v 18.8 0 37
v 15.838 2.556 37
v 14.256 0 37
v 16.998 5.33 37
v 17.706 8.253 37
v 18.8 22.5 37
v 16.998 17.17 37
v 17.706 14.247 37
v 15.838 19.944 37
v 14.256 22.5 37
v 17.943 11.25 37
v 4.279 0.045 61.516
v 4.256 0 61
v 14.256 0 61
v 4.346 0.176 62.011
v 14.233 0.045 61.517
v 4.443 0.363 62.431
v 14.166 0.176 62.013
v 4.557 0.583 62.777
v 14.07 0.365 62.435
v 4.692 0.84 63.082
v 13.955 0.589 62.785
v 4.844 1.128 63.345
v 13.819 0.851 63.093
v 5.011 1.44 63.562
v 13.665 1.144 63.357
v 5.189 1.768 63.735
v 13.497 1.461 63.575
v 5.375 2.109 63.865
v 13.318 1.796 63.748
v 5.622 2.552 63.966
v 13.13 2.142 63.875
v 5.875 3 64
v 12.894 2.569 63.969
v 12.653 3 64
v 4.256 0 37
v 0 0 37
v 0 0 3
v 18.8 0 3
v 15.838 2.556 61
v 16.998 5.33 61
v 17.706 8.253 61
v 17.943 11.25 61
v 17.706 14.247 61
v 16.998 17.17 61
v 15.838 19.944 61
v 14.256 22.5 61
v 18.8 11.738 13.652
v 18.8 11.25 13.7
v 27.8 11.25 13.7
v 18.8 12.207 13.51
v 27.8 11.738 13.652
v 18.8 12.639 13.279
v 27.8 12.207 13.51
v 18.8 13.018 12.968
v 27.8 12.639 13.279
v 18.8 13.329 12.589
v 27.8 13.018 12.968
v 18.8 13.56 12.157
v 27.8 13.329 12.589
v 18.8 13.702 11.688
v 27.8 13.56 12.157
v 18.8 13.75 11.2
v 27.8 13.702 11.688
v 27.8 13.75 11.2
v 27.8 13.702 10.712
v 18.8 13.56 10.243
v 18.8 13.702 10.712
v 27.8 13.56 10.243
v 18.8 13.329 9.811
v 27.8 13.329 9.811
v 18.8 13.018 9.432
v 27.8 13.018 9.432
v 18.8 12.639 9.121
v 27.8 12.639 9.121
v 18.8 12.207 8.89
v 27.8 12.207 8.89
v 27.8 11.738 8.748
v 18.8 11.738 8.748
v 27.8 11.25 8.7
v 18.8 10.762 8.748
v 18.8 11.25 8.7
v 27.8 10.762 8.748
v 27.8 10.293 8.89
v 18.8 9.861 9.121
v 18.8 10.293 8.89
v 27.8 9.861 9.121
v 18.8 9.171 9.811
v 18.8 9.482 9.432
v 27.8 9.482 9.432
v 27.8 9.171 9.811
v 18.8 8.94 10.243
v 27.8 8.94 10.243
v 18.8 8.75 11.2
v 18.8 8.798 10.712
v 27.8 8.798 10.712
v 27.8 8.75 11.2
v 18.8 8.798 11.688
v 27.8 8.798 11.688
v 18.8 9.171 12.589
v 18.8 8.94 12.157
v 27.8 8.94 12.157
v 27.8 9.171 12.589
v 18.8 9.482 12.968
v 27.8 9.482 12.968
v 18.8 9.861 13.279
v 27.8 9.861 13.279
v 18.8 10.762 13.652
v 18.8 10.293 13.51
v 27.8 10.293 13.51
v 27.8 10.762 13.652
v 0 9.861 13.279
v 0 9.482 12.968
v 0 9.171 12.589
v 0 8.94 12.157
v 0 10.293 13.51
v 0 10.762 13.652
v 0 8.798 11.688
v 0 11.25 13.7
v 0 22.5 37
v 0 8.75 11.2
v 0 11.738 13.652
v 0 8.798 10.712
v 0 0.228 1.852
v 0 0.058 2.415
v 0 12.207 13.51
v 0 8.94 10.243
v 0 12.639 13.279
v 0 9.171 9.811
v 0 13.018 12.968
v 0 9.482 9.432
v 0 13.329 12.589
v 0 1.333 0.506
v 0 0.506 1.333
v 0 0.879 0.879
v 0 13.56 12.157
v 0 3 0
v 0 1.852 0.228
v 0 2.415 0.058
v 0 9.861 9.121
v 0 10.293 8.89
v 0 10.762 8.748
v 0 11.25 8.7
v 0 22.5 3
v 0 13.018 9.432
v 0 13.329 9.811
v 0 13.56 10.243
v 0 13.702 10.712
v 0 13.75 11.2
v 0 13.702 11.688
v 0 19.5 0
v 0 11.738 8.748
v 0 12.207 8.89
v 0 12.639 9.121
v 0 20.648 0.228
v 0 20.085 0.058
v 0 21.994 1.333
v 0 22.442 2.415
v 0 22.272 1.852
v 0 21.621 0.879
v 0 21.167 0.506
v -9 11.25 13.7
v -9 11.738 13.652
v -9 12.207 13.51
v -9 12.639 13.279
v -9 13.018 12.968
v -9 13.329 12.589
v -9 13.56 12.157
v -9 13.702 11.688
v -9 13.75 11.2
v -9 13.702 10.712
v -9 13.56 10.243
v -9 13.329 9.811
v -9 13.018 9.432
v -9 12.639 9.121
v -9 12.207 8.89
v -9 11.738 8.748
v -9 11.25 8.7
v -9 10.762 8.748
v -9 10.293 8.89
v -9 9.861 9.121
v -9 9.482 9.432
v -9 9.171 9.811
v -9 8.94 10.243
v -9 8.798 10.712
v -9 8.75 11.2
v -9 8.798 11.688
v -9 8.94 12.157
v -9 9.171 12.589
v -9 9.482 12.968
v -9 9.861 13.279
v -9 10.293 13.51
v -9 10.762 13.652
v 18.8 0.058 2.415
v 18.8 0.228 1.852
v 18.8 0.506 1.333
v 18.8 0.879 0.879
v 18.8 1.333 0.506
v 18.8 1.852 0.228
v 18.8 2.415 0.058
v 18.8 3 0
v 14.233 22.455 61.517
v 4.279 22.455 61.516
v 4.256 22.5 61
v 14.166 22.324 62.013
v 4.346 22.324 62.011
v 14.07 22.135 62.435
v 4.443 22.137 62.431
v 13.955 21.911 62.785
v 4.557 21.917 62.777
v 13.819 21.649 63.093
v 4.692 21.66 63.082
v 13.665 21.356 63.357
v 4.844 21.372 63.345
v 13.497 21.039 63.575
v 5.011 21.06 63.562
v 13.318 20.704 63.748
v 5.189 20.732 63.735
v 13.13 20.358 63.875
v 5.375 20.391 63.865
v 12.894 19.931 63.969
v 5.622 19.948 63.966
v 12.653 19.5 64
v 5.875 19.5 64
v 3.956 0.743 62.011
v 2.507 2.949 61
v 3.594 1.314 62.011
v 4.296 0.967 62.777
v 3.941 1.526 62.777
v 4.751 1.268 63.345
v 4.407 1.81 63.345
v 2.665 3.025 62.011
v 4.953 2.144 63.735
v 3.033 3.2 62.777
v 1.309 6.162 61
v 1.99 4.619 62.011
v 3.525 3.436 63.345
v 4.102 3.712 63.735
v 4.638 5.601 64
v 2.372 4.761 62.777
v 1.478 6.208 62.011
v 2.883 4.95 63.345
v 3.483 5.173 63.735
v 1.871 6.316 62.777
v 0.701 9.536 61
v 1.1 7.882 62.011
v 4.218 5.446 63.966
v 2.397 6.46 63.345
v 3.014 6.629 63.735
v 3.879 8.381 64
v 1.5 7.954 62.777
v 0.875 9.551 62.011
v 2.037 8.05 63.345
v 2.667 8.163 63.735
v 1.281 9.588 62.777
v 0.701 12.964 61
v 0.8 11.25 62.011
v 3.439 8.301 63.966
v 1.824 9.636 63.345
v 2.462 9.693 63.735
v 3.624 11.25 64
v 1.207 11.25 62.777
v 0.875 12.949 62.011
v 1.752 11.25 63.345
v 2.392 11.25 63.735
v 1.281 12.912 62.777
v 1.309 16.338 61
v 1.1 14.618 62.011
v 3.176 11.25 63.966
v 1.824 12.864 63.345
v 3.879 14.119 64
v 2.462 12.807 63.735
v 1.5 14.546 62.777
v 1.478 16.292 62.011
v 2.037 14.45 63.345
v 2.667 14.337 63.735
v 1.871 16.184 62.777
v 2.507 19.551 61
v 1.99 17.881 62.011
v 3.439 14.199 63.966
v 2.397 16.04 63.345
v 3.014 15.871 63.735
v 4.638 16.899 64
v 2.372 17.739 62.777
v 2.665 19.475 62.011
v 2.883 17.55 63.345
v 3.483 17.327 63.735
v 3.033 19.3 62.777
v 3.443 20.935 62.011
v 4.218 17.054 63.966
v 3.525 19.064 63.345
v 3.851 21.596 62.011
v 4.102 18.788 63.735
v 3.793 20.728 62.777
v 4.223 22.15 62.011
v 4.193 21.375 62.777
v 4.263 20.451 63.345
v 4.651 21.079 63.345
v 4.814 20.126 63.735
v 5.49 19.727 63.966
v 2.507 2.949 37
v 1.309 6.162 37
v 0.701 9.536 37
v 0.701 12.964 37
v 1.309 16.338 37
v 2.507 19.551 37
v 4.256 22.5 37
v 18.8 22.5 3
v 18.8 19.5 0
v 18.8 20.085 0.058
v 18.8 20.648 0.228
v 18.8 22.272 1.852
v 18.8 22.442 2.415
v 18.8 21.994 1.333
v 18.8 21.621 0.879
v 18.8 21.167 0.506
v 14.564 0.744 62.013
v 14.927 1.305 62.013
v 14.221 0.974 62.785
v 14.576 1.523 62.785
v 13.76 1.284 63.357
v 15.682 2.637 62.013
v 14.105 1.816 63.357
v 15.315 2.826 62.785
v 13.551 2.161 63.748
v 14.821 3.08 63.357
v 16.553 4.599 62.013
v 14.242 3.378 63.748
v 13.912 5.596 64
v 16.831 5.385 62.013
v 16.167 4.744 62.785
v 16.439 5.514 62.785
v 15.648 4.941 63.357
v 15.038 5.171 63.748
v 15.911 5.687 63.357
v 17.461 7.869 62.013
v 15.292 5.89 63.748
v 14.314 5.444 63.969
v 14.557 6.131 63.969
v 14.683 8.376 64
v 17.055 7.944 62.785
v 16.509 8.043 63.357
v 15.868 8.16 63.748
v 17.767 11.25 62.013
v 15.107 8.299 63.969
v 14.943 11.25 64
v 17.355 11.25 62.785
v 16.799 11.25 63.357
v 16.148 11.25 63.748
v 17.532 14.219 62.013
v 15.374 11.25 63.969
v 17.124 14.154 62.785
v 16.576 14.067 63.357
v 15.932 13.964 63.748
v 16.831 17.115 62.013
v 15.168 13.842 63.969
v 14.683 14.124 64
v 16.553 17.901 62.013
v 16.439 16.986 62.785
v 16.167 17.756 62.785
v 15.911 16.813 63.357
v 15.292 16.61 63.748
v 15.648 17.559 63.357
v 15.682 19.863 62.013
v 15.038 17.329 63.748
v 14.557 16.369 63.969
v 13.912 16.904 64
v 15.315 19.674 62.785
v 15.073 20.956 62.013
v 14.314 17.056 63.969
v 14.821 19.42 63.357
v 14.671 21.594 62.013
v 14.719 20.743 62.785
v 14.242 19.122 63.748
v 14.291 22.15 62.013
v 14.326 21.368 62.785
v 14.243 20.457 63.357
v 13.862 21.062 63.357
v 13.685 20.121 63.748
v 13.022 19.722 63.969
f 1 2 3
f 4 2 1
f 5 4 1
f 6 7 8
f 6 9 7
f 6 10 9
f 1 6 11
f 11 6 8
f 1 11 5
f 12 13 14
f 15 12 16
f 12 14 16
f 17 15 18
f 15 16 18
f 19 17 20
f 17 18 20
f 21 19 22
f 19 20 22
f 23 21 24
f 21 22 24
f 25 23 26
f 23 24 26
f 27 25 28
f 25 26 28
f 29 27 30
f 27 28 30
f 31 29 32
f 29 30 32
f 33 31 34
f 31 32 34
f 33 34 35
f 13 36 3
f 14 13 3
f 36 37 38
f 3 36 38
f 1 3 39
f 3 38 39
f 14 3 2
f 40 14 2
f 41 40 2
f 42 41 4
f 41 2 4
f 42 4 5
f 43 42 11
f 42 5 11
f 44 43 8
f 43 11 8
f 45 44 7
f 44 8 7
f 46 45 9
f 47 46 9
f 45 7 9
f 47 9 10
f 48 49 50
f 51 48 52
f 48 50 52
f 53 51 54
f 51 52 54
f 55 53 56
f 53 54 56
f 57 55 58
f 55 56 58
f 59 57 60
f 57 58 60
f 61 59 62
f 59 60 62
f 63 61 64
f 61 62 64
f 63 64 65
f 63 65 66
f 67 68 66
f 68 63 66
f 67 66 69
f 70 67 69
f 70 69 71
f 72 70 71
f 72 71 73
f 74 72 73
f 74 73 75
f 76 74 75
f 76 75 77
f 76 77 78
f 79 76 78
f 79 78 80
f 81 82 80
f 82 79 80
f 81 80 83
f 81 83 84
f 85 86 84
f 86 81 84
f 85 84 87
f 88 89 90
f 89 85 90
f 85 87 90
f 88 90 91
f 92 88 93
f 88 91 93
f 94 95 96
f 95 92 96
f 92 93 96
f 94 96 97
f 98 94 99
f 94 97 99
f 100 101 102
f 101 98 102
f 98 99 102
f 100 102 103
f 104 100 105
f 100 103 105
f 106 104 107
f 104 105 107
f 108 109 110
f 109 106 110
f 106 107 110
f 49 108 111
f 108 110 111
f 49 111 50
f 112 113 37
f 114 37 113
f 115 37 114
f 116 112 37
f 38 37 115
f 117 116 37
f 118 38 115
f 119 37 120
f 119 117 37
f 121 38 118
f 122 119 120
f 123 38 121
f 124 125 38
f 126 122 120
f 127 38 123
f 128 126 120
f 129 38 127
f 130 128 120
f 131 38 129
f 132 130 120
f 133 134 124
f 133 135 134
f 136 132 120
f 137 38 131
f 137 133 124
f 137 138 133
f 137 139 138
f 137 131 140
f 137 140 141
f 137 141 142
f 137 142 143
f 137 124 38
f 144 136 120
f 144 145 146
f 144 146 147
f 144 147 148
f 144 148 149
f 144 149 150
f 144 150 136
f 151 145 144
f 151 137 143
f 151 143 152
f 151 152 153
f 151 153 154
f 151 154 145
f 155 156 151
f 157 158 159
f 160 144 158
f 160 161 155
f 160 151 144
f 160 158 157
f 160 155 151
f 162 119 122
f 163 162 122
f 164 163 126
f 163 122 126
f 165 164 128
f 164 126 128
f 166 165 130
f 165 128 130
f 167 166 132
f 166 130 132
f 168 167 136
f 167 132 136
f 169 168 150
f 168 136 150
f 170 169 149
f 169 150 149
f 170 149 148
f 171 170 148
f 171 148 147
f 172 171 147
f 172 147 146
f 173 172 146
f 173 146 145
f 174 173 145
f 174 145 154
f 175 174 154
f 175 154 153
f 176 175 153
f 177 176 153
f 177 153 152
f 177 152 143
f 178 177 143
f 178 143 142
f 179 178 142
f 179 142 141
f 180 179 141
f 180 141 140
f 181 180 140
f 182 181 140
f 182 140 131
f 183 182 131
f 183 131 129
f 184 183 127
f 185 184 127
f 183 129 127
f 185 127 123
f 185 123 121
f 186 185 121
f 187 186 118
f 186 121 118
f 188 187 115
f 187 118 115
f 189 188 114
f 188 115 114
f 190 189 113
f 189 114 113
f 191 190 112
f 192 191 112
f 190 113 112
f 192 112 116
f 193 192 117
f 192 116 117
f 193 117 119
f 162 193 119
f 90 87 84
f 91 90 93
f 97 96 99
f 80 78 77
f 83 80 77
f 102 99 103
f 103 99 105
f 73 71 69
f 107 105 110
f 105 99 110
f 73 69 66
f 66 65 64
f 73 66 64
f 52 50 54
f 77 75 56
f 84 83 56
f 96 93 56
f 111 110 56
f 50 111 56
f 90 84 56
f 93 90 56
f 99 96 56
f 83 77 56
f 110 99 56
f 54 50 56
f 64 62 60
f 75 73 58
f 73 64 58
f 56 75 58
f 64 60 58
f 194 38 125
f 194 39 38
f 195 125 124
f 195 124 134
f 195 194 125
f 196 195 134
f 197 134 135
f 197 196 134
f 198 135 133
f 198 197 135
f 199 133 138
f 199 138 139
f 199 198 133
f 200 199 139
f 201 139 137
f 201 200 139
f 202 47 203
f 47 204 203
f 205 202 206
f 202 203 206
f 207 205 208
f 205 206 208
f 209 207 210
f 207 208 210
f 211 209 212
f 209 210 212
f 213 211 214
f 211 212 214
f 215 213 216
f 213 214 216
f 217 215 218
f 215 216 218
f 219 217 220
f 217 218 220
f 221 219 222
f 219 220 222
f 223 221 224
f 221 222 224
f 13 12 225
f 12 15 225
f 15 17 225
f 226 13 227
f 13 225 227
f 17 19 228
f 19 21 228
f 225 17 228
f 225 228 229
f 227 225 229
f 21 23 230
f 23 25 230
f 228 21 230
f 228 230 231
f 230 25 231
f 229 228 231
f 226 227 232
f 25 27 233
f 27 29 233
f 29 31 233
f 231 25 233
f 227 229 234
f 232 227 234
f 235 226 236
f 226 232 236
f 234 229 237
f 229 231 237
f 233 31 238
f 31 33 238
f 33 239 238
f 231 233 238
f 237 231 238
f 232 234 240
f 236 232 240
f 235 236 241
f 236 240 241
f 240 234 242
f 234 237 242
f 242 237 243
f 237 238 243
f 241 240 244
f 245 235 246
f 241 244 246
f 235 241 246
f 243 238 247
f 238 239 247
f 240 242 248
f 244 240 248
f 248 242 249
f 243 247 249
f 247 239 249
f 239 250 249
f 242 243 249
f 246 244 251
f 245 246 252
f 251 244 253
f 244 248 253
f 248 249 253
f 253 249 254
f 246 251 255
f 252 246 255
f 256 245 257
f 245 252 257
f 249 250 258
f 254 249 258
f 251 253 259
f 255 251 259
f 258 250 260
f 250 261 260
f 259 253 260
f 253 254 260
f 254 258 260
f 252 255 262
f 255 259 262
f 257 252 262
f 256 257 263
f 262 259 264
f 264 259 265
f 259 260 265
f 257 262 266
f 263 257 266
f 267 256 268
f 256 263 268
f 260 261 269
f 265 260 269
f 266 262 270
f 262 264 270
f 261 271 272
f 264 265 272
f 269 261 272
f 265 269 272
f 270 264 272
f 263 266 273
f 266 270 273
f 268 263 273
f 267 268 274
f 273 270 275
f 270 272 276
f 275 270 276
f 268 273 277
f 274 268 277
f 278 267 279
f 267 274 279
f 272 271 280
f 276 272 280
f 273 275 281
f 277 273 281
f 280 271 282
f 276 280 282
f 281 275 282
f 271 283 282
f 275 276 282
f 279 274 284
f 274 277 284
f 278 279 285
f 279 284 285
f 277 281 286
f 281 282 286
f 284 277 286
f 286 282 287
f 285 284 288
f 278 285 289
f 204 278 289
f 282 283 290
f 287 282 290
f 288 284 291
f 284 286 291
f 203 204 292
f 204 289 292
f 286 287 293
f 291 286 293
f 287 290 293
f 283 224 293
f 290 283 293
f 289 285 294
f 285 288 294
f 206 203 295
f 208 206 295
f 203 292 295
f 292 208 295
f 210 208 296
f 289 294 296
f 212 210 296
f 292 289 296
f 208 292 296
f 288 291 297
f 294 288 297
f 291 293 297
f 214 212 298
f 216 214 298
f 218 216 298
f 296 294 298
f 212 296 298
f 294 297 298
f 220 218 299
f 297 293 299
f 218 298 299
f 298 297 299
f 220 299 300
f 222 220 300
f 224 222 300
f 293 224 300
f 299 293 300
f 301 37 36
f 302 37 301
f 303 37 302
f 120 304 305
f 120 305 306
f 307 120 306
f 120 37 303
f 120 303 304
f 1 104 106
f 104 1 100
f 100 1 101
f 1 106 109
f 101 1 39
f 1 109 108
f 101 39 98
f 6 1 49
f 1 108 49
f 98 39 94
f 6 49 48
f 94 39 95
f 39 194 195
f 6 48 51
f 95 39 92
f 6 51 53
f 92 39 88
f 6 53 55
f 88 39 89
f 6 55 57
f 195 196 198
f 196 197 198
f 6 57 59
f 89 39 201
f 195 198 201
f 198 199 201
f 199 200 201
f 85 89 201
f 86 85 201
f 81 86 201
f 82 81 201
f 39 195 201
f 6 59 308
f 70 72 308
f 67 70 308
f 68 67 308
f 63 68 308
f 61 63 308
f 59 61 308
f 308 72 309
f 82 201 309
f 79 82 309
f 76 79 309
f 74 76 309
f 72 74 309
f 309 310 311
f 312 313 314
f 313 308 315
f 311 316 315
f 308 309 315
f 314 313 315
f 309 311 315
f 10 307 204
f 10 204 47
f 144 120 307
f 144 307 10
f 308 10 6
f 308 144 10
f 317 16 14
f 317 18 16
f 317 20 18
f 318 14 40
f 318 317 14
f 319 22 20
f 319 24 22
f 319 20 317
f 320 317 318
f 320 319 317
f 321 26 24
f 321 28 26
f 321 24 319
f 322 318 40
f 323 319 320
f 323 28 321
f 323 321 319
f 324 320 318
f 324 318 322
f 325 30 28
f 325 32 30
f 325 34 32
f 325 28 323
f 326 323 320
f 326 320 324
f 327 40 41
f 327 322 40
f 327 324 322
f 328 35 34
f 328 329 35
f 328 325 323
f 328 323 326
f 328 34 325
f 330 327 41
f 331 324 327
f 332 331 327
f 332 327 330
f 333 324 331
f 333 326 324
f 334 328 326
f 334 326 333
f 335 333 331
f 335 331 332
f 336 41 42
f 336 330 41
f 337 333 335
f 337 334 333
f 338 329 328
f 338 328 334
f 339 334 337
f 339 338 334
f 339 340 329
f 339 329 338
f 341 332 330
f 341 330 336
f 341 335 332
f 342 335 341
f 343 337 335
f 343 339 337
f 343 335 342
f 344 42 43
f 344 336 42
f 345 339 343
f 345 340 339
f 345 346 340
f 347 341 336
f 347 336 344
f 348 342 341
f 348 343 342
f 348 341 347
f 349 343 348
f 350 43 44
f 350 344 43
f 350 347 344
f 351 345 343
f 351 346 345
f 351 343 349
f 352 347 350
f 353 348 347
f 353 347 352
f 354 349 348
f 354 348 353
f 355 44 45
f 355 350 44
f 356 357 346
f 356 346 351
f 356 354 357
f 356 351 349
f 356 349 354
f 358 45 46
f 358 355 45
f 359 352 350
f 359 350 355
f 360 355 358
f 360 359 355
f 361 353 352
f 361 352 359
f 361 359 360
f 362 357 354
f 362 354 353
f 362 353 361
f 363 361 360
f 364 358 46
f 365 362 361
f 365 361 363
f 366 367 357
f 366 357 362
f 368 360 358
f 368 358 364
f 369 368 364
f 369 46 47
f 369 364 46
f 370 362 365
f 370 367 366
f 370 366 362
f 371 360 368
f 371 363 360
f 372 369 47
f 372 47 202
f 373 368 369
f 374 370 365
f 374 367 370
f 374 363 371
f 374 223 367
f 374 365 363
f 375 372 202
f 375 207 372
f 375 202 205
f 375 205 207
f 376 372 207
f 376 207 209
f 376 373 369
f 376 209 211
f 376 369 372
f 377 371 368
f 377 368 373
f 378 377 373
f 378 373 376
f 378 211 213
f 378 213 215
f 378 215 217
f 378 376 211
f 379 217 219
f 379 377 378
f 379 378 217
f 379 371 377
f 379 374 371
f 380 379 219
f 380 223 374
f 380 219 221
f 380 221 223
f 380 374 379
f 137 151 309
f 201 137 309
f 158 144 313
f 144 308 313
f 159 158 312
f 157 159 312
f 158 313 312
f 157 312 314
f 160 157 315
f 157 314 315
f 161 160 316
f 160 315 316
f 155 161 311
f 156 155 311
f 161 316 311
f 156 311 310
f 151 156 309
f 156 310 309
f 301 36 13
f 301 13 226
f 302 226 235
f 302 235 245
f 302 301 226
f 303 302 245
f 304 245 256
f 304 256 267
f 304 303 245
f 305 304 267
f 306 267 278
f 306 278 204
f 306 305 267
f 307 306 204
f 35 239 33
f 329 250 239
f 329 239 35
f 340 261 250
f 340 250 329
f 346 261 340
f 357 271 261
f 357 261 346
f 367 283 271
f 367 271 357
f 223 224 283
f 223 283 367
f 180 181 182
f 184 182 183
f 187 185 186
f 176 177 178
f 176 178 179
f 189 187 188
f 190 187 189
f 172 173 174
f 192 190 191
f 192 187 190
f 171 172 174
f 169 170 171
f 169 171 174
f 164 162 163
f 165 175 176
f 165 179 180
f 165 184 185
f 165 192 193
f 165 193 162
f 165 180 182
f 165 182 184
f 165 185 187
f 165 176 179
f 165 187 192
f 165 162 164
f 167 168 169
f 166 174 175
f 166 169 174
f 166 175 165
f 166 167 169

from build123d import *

# Parameters (mm, degrees)
SKETCH_1_W           = 18.8
SKETCH_1_H           = 22.5
EXTRUDE_1_DEPTH      = 37
FILLET_1_R           = 3
SKETCH_2_W           = 5
SKETCH_2_H           = 22.5
EXTRUDE_2_DEPTH      = 27
FILLET_2_R           = 3
EXTRUDE_3_DEPTH      = 9
EXTRUDE_3_DEPTH_BACK = 27.8
SKETCH_3_R           = 2.5


with BuildPart() as part:
    # 草图1 → 凸台-拉伸1 (new body)
    with BuildSketch(Plane.XY):
        with Locations((9.4, 11.25)):
            Rectangle(SKETCH_1_W, SKETCH_1_H)
    extrude(amount=EXTRUDE_1_DEPTH)

    # 圆角1
    fillet_1_edges = [part.edges().sort_by_distance(p)[0] for p in [
        (9.4, 0, 0),
        (9.4, 22.5, 0),
    ]]
    fillet(fillet_1_edges, radius=FILLET_1_R)

    # 草图2 → 凸台-拉伸2 (add)
    with BuildSketch(Plane.XY.offset(37)):
        with Locations((6.75562561, 11.25)):
            Rectangle(SKETCH_2_W, SKETCH_2_H)
        with Locations((11.75562561, 11.25)):
            Rectangle(SKETCH_2_W, SKETCH_2_H)
        with BuildLine():
            Line((14.25562561, 22.5), (14.25562561, 0))
            ThreePointArc((14.25562561, 0), (17.943444104, 11.25), (14.25562561, 22.5))
        make_face()
        with BuildLine():
            Line((4.25562561, 22.5), (4.25562561, 0))
            ThreePointArc((4.25562561, 0), (0.624004306, 11.25), (4.25562561, 22.5))
        make_face()
    extrude(amount=EXTRUDE_2_DEPTH)

    # 圆角2
    fillet_2_edges = [part.edges().sort_by_distance(p)[0] for p in [
        (9.25562561, 0, 64),
        (17.943444104, 11.25, 64),
        (9.25562561, 22.5, 64),
        (0.624004306, 11.25, 64),
    ]]
    fillet(fillet_2_edges, radius=FILLET_2_R)

    # 草图3 → 凸台-拉伸3 (add, two sides: drawn at the far end of the back side and taken through both)
    with BuildSketch(Plane.ZY.offset(-EXTRUDE_3_DEPTH_BACK)):
        with Locations((11.2, 11.25)):
            Circle(SKETCH_3_R)
    extrude(amount=EXTRUDE_3_DEPTH + EXTRUDE_3_DEPTH_BACK)


solid = part.part
